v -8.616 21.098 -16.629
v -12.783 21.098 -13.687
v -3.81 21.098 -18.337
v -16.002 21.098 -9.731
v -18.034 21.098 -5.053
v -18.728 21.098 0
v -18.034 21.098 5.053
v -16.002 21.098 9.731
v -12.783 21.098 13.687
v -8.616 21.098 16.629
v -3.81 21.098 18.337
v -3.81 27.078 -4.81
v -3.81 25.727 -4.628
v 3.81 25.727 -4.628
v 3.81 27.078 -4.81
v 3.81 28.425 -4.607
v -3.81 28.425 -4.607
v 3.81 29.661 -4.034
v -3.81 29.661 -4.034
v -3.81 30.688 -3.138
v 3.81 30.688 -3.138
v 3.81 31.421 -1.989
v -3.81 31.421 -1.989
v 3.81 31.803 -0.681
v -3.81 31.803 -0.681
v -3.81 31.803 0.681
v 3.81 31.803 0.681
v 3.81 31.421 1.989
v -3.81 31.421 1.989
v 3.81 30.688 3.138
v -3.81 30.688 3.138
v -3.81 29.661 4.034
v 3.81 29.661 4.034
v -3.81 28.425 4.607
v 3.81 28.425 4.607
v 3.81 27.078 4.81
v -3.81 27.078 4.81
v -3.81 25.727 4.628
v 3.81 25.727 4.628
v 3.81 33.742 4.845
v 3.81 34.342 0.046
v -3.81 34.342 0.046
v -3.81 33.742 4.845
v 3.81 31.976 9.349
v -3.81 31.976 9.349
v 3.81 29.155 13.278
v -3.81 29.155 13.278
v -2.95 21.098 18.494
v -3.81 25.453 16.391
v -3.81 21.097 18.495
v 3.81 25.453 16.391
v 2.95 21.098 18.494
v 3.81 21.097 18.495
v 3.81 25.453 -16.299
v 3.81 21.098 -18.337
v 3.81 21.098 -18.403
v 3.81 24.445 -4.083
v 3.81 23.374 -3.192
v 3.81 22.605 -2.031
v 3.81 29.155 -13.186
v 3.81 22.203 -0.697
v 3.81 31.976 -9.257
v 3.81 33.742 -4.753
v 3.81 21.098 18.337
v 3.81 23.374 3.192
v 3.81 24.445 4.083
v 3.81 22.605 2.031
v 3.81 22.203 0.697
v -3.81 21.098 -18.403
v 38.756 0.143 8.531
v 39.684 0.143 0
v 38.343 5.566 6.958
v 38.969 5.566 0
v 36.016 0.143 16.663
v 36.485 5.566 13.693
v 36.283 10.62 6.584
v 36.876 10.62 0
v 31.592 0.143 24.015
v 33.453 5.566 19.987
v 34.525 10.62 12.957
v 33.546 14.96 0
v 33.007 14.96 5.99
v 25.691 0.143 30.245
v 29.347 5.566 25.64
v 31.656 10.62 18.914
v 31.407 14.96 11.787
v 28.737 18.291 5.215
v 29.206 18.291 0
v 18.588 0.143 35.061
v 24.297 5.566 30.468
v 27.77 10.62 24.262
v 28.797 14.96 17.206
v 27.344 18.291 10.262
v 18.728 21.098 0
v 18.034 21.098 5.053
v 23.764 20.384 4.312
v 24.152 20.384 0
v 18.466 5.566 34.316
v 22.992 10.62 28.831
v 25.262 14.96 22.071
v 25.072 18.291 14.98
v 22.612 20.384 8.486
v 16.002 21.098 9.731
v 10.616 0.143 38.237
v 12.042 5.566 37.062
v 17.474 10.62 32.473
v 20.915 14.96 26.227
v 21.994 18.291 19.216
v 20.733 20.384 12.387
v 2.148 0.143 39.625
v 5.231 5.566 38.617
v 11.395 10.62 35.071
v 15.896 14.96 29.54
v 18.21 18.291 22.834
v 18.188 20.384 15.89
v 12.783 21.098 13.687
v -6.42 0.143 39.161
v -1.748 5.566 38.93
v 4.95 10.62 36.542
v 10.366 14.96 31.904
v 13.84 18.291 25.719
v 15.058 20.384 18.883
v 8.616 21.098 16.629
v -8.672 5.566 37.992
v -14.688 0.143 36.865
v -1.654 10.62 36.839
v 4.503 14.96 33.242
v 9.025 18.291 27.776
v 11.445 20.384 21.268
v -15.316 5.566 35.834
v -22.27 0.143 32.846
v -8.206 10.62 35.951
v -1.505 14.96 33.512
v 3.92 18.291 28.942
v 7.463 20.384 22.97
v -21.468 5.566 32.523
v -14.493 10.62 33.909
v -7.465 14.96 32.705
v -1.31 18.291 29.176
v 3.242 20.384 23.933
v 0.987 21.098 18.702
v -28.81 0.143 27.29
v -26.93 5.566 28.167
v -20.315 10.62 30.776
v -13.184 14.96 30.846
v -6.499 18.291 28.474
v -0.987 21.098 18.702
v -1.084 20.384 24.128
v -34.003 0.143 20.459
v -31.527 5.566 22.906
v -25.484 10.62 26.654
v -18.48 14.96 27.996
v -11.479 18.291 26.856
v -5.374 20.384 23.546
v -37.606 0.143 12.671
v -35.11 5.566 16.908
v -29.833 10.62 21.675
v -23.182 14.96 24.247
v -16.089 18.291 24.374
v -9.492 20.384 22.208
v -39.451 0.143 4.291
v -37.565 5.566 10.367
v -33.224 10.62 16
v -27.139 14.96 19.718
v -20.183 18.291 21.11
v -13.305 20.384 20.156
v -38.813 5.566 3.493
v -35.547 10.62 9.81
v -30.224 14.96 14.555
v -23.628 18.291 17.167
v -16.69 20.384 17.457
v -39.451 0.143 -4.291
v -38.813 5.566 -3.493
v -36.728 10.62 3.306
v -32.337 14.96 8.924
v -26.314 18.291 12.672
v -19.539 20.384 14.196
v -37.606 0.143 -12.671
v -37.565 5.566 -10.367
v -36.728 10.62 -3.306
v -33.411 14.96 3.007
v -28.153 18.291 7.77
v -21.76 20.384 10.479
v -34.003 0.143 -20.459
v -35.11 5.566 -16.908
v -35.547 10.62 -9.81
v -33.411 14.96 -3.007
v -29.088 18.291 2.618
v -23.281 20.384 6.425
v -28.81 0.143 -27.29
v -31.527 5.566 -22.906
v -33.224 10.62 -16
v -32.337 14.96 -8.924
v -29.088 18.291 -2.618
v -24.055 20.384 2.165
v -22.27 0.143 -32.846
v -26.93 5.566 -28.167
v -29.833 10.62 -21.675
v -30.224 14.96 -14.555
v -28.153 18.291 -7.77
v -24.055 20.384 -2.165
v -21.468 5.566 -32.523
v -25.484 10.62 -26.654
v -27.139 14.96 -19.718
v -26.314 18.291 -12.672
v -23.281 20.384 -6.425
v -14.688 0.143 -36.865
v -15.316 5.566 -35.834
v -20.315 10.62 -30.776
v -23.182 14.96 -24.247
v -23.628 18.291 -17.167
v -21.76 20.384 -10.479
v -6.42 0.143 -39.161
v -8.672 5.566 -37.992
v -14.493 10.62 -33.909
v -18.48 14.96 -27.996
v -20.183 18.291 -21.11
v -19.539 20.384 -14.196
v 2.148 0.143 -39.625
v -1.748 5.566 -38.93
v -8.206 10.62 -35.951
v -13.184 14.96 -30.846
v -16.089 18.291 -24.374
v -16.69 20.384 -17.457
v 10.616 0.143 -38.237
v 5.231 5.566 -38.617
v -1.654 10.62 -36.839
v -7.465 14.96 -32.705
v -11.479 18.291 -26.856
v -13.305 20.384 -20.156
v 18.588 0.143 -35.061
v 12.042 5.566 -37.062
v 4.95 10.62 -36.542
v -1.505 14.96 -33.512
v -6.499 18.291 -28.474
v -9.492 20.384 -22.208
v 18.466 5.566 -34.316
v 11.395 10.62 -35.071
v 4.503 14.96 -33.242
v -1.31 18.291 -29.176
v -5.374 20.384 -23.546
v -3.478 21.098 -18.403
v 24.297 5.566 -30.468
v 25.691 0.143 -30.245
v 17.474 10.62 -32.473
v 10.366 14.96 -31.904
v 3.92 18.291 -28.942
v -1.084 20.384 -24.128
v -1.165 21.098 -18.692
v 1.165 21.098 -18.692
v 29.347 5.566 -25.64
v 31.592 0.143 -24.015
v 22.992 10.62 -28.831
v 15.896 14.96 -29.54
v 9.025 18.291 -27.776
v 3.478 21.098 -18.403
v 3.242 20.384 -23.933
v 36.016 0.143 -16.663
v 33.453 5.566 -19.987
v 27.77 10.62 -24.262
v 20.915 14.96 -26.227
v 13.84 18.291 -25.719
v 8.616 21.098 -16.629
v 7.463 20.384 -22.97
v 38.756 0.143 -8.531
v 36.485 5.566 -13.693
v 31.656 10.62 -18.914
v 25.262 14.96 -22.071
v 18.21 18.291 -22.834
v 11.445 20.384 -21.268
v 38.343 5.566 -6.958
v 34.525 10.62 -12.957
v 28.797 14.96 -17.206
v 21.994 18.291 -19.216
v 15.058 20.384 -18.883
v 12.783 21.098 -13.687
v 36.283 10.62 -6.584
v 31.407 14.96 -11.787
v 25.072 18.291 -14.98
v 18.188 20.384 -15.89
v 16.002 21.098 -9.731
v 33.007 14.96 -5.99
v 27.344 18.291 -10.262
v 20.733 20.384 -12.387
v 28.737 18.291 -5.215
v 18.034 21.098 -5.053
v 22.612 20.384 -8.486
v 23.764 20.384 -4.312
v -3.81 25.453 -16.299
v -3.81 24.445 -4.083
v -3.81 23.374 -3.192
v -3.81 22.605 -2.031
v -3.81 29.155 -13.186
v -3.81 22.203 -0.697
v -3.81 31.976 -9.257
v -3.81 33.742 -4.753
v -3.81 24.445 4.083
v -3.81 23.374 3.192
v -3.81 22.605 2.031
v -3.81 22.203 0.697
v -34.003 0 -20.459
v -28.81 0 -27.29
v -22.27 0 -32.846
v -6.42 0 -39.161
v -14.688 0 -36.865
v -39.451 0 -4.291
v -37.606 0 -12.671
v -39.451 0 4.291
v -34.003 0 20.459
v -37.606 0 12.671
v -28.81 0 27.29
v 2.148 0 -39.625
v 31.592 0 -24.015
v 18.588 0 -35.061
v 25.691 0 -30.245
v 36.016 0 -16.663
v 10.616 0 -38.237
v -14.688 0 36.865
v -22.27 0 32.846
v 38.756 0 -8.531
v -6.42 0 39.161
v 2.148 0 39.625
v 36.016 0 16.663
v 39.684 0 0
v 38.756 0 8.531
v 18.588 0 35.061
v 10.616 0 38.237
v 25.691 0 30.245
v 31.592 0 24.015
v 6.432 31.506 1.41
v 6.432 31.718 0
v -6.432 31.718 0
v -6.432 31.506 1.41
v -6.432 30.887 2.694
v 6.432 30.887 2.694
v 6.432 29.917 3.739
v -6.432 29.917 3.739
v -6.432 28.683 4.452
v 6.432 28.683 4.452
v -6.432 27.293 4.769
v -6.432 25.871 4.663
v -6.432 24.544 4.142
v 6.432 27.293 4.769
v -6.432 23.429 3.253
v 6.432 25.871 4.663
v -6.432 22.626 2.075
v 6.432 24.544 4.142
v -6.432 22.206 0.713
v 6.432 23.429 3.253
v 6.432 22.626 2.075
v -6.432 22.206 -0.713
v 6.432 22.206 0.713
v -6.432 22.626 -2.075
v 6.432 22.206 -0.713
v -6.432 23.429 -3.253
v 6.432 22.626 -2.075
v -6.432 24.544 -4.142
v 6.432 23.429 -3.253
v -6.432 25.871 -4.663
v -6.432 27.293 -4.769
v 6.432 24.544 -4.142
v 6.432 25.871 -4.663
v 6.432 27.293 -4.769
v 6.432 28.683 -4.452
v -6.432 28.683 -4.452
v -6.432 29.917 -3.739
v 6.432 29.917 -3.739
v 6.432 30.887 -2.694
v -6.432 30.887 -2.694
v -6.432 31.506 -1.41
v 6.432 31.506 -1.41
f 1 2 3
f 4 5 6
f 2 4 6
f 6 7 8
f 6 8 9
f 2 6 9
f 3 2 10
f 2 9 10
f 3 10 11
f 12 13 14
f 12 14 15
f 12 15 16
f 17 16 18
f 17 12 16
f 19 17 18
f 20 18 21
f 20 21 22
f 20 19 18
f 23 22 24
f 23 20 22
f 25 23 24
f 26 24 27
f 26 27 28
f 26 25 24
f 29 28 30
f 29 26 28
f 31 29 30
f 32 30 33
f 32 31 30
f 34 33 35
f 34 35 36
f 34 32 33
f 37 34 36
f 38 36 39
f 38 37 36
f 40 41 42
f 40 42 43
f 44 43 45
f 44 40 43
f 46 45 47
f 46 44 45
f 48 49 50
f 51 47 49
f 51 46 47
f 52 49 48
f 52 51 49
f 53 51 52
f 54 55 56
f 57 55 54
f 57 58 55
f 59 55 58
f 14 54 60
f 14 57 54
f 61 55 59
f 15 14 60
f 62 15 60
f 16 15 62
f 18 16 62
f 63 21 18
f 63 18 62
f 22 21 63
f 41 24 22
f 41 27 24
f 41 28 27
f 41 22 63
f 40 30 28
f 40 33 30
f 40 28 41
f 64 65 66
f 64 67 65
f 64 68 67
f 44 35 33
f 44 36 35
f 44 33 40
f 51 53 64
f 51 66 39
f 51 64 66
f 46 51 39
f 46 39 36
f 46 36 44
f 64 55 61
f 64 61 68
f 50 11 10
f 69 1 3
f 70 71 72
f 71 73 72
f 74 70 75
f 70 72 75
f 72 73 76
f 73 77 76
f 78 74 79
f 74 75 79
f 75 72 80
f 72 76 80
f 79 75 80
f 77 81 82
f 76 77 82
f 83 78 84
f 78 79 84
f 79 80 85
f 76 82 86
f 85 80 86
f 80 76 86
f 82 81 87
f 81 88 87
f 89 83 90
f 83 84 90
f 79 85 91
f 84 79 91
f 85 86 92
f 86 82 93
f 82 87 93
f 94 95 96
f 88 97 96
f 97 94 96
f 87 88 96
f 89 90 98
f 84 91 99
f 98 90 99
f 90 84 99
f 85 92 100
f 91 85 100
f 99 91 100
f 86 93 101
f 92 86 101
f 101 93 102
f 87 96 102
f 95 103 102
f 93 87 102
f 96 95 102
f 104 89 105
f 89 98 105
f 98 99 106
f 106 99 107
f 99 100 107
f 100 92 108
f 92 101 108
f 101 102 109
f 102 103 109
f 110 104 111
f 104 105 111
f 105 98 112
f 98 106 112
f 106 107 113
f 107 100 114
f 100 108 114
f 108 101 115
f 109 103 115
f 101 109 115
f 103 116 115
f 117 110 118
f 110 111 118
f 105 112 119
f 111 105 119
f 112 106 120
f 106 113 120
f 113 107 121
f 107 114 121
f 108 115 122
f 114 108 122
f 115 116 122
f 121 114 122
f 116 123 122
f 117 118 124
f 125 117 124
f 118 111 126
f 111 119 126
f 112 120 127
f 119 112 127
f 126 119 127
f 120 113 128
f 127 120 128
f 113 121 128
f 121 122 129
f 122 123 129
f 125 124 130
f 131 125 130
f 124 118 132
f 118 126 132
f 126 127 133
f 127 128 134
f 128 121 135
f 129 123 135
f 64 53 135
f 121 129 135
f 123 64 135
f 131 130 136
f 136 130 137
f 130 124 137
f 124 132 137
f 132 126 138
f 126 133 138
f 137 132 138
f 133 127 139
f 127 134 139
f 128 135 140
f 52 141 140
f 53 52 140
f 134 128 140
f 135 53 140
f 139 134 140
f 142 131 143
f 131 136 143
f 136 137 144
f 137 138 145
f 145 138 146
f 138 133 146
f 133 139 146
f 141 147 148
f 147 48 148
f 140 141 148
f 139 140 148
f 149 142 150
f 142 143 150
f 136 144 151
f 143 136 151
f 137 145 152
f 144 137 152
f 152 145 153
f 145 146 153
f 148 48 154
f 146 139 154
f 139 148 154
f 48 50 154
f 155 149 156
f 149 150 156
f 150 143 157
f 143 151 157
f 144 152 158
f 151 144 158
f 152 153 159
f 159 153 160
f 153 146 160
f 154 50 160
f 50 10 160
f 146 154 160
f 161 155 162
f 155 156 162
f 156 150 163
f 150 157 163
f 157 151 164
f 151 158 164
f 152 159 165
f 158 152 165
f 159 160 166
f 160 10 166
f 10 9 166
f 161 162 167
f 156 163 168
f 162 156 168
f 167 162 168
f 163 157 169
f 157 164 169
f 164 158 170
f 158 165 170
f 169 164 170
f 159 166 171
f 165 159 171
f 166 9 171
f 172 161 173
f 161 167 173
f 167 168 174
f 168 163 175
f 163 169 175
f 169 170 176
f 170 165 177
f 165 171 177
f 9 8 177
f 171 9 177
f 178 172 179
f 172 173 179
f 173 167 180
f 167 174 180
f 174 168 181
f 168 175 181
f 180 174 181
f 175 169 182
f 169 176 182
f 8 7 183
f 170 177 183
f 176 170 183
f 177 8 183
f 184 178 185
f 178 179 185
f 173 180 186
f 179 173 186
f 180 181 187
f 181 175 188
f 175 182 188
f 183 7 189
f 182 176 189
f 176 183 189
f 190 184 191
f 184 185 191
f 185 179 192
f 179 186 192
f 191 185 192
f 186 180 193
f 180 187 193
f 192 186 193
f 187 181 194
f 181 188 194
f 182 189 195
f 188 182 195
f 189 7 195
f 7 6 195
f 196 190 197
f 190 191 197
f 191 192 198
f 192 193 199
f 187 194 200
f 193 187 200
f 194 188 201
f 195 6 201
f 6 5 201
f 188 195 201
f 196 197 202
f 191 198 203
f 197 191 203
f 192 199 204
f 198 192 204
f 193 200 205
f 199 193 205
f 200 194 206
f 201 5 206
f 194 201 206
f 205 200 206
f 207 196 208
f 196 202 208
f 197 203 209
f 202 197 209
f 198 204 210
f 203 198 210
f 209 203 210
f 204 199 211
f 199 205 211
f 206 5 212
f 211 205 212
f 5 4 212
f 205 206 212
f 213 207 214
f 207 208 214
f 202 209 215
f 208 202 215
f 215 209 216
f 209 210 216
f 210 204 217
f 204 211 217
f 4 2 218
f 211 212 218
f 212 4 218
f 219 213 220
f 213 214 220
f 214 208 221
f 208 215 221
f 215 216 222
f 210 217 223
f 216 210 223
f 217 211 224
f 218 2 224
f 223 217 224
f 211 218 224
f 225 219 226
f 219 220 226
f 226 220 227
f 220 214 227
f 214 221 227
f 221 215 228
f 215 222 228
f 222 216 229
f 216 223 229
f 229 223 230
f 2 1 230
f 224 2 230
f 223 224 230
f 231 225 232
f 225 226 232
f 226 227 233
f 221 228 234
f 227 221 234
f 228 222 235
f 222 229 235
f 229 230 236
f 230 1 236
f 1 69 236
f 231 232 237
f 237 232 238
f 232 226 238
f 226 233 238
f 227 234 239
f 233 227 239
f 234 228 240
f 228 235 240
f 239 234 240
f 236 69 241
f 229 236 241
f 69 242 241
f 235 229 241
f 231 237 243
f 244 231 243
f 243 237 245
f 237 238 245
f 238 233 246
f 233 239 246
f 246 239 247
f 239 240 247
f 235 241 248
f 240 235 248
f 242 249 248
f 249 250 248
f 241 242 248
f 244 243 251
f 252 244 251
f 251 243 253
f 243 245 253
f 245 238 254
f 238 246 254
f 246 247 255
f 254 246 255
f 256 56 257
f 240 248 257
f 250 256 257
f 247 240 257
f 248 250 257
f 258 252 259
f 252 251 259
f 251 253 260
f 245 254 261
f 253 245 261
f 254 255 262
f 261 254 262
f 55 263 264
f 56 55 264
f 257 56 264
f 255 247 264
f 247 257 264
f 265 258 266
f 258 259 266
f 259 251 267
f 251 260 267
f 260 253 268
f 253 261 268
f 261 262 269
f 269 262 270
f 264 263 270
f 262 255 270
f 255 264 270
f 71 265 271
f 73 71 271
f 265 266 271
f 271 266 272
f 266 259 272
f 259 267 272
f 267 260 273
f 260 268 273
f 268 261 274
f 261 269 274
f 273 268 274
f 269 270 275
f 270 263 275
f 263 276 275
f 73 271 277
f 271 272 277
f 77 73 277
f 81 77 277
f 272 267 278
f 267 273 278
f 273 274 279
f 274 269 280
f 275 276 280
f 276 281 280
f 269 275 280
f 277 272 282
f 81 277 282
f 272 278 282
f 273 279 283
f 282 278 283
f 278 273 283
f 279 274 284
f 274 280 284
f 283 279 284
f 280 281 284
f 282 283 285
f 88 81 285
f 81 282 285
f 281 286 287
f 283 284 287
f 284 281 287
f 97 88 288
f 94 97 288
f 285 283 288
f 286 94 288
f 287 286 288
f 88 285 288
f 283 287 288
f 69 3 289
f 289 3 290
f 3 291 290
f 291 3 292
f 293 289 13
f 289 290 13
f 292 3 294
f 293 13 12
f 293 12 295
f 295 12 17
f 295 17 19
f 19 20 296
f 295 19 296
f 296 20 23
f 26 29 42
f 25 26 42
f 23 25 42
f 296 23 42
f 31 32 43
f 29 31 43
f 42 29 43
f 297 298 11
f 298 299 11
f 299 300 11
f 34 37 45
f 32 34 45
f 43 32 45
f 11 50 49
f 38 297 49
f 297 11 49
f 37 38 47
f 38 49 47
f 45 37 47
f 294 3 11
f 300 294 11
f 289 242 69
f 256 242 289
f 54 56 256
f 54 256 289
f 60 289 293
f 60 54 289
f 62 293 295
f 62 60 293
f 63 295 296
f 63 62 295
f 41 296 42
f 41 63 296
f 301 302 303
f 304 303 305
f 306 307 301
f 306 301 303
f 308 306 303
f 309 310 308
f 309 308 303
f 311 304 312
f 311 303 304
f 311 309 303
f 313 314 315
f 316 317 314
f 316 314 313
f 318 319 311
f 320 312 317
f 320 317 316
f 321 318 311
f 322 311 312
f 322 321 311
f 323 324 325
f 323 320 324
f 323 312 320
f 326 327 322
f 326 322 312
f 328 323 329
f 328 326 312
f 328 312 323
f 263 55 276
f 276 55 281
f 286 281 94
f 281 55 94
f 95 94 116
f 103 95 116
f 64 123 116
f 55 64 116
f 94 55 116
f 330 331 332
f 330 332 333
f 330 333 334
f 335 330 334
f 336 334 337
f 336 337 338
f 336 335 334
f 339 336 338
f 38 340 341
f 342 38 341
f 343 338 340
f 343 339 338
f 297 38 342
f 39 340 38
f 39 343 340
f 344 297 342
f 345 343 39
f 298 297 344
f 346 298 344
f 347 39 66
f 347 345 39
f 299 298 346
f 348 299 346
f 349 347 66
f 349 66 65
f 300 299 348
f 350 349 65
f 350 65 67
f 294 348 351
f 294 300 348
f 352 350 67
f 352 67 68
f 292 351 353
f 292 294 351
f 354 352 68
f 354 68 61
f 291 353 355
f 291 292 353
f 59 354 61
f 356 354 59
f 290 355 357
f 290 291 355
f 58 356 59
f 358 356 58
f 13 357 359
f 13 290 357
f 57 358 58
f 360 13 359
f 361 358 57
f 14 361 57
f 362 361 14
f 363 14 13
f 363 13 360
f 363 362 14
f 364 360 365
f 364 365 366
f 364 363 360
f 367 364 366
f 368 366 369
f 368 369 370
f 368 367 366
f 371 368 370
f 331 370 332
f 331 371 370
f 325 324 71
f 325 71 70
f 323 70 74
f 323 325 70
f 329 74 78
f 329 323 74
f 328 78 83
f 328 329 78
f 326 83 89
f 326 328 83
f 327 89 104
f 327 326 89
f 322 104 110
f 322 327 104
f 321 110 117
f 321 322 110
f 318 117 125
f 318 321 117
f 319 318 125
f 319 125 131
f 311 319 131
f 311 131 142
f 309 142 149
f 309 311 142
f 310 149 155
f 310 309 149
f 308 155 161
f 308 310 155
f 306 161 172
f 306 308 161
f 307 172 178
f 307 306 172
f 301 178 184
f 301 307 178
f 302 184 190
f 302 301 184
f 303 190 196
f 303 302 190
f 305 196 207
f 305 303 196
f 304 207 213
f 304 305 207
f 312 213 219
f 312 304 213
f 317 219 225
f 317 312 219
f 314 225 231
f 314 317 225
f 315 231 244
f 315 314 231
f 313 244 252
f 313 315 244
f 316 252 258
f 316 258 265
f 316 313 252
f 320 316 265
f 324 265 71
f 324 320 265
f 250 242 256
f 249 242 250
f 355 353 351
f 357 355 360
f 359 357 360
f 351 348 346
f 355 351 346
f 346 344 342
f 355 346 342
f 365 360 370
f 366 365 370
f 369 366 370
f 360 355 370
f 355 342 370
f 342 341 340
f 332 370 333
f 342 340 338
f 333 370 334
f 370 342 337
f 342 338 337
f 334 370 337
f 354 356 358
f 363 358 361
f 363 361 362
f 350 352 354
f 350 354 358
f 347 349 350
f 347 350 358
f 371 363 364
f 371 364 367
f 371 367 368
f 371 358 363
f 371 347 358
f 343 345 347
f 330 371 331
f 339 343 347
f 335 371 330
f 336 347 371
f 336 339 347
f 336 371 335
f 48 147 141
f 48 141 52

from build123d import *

# Parameters (mm, degrees)
F0_R     = 39.683512
F1_DEPTH = 21.09801
F2_R     = 20.955301
F3_R     = 4.810594
F4_DEPTH = 3.81
F5_R     = 4.782773
F6_DEPTH = 6.43239


with BuildPart() as f1:
    # F0 (on Front) → F1 (new body)
    with BuildSketch(Plane.XZ):
        Circle(F0_R)
    extrude(amount=-F1_DEPTH)

    # F2
    f2_edges = [f1.edges().sort_by_distance(p)[0] for p in [
        (-39.683512, 21.09801, 0),
    ]]
    fillet(f2_edges, radius=F2_R)

    # F3 (on Right) → F4 (join, symmetric)
    with BuildSketch(Plane.YZ):
        with BuildLine():
            ThreePointArc((14.871401, -19.424973), (28.639419, -13.722073), (34.342318, 0.045945))
            ThreePointArc((34.342318, 0.045945), (28.639419, 13.813962), (14.871401, 19.516862))
            Line((14.871401, 19.516862), (14.871401, 0.045945))
            Line((14.871401, 0.045945), (14.871401, -19.424973))
        make_face()
        with Locations((27.04107, 0)):
            Circle(F3_R, mode=Mode.SUBTRACT)
    extrude(amount=F4_DEPTH, both=True)

    # F5 (on Right) → F6 (join, symmetric)
    with BuildSketch(Plane.YZ):
        with Locations((26.935229, 0)):
            Circle(F5_R)
    extrude(amount=F6_DEPTH, both=True)


solid = f1.part
